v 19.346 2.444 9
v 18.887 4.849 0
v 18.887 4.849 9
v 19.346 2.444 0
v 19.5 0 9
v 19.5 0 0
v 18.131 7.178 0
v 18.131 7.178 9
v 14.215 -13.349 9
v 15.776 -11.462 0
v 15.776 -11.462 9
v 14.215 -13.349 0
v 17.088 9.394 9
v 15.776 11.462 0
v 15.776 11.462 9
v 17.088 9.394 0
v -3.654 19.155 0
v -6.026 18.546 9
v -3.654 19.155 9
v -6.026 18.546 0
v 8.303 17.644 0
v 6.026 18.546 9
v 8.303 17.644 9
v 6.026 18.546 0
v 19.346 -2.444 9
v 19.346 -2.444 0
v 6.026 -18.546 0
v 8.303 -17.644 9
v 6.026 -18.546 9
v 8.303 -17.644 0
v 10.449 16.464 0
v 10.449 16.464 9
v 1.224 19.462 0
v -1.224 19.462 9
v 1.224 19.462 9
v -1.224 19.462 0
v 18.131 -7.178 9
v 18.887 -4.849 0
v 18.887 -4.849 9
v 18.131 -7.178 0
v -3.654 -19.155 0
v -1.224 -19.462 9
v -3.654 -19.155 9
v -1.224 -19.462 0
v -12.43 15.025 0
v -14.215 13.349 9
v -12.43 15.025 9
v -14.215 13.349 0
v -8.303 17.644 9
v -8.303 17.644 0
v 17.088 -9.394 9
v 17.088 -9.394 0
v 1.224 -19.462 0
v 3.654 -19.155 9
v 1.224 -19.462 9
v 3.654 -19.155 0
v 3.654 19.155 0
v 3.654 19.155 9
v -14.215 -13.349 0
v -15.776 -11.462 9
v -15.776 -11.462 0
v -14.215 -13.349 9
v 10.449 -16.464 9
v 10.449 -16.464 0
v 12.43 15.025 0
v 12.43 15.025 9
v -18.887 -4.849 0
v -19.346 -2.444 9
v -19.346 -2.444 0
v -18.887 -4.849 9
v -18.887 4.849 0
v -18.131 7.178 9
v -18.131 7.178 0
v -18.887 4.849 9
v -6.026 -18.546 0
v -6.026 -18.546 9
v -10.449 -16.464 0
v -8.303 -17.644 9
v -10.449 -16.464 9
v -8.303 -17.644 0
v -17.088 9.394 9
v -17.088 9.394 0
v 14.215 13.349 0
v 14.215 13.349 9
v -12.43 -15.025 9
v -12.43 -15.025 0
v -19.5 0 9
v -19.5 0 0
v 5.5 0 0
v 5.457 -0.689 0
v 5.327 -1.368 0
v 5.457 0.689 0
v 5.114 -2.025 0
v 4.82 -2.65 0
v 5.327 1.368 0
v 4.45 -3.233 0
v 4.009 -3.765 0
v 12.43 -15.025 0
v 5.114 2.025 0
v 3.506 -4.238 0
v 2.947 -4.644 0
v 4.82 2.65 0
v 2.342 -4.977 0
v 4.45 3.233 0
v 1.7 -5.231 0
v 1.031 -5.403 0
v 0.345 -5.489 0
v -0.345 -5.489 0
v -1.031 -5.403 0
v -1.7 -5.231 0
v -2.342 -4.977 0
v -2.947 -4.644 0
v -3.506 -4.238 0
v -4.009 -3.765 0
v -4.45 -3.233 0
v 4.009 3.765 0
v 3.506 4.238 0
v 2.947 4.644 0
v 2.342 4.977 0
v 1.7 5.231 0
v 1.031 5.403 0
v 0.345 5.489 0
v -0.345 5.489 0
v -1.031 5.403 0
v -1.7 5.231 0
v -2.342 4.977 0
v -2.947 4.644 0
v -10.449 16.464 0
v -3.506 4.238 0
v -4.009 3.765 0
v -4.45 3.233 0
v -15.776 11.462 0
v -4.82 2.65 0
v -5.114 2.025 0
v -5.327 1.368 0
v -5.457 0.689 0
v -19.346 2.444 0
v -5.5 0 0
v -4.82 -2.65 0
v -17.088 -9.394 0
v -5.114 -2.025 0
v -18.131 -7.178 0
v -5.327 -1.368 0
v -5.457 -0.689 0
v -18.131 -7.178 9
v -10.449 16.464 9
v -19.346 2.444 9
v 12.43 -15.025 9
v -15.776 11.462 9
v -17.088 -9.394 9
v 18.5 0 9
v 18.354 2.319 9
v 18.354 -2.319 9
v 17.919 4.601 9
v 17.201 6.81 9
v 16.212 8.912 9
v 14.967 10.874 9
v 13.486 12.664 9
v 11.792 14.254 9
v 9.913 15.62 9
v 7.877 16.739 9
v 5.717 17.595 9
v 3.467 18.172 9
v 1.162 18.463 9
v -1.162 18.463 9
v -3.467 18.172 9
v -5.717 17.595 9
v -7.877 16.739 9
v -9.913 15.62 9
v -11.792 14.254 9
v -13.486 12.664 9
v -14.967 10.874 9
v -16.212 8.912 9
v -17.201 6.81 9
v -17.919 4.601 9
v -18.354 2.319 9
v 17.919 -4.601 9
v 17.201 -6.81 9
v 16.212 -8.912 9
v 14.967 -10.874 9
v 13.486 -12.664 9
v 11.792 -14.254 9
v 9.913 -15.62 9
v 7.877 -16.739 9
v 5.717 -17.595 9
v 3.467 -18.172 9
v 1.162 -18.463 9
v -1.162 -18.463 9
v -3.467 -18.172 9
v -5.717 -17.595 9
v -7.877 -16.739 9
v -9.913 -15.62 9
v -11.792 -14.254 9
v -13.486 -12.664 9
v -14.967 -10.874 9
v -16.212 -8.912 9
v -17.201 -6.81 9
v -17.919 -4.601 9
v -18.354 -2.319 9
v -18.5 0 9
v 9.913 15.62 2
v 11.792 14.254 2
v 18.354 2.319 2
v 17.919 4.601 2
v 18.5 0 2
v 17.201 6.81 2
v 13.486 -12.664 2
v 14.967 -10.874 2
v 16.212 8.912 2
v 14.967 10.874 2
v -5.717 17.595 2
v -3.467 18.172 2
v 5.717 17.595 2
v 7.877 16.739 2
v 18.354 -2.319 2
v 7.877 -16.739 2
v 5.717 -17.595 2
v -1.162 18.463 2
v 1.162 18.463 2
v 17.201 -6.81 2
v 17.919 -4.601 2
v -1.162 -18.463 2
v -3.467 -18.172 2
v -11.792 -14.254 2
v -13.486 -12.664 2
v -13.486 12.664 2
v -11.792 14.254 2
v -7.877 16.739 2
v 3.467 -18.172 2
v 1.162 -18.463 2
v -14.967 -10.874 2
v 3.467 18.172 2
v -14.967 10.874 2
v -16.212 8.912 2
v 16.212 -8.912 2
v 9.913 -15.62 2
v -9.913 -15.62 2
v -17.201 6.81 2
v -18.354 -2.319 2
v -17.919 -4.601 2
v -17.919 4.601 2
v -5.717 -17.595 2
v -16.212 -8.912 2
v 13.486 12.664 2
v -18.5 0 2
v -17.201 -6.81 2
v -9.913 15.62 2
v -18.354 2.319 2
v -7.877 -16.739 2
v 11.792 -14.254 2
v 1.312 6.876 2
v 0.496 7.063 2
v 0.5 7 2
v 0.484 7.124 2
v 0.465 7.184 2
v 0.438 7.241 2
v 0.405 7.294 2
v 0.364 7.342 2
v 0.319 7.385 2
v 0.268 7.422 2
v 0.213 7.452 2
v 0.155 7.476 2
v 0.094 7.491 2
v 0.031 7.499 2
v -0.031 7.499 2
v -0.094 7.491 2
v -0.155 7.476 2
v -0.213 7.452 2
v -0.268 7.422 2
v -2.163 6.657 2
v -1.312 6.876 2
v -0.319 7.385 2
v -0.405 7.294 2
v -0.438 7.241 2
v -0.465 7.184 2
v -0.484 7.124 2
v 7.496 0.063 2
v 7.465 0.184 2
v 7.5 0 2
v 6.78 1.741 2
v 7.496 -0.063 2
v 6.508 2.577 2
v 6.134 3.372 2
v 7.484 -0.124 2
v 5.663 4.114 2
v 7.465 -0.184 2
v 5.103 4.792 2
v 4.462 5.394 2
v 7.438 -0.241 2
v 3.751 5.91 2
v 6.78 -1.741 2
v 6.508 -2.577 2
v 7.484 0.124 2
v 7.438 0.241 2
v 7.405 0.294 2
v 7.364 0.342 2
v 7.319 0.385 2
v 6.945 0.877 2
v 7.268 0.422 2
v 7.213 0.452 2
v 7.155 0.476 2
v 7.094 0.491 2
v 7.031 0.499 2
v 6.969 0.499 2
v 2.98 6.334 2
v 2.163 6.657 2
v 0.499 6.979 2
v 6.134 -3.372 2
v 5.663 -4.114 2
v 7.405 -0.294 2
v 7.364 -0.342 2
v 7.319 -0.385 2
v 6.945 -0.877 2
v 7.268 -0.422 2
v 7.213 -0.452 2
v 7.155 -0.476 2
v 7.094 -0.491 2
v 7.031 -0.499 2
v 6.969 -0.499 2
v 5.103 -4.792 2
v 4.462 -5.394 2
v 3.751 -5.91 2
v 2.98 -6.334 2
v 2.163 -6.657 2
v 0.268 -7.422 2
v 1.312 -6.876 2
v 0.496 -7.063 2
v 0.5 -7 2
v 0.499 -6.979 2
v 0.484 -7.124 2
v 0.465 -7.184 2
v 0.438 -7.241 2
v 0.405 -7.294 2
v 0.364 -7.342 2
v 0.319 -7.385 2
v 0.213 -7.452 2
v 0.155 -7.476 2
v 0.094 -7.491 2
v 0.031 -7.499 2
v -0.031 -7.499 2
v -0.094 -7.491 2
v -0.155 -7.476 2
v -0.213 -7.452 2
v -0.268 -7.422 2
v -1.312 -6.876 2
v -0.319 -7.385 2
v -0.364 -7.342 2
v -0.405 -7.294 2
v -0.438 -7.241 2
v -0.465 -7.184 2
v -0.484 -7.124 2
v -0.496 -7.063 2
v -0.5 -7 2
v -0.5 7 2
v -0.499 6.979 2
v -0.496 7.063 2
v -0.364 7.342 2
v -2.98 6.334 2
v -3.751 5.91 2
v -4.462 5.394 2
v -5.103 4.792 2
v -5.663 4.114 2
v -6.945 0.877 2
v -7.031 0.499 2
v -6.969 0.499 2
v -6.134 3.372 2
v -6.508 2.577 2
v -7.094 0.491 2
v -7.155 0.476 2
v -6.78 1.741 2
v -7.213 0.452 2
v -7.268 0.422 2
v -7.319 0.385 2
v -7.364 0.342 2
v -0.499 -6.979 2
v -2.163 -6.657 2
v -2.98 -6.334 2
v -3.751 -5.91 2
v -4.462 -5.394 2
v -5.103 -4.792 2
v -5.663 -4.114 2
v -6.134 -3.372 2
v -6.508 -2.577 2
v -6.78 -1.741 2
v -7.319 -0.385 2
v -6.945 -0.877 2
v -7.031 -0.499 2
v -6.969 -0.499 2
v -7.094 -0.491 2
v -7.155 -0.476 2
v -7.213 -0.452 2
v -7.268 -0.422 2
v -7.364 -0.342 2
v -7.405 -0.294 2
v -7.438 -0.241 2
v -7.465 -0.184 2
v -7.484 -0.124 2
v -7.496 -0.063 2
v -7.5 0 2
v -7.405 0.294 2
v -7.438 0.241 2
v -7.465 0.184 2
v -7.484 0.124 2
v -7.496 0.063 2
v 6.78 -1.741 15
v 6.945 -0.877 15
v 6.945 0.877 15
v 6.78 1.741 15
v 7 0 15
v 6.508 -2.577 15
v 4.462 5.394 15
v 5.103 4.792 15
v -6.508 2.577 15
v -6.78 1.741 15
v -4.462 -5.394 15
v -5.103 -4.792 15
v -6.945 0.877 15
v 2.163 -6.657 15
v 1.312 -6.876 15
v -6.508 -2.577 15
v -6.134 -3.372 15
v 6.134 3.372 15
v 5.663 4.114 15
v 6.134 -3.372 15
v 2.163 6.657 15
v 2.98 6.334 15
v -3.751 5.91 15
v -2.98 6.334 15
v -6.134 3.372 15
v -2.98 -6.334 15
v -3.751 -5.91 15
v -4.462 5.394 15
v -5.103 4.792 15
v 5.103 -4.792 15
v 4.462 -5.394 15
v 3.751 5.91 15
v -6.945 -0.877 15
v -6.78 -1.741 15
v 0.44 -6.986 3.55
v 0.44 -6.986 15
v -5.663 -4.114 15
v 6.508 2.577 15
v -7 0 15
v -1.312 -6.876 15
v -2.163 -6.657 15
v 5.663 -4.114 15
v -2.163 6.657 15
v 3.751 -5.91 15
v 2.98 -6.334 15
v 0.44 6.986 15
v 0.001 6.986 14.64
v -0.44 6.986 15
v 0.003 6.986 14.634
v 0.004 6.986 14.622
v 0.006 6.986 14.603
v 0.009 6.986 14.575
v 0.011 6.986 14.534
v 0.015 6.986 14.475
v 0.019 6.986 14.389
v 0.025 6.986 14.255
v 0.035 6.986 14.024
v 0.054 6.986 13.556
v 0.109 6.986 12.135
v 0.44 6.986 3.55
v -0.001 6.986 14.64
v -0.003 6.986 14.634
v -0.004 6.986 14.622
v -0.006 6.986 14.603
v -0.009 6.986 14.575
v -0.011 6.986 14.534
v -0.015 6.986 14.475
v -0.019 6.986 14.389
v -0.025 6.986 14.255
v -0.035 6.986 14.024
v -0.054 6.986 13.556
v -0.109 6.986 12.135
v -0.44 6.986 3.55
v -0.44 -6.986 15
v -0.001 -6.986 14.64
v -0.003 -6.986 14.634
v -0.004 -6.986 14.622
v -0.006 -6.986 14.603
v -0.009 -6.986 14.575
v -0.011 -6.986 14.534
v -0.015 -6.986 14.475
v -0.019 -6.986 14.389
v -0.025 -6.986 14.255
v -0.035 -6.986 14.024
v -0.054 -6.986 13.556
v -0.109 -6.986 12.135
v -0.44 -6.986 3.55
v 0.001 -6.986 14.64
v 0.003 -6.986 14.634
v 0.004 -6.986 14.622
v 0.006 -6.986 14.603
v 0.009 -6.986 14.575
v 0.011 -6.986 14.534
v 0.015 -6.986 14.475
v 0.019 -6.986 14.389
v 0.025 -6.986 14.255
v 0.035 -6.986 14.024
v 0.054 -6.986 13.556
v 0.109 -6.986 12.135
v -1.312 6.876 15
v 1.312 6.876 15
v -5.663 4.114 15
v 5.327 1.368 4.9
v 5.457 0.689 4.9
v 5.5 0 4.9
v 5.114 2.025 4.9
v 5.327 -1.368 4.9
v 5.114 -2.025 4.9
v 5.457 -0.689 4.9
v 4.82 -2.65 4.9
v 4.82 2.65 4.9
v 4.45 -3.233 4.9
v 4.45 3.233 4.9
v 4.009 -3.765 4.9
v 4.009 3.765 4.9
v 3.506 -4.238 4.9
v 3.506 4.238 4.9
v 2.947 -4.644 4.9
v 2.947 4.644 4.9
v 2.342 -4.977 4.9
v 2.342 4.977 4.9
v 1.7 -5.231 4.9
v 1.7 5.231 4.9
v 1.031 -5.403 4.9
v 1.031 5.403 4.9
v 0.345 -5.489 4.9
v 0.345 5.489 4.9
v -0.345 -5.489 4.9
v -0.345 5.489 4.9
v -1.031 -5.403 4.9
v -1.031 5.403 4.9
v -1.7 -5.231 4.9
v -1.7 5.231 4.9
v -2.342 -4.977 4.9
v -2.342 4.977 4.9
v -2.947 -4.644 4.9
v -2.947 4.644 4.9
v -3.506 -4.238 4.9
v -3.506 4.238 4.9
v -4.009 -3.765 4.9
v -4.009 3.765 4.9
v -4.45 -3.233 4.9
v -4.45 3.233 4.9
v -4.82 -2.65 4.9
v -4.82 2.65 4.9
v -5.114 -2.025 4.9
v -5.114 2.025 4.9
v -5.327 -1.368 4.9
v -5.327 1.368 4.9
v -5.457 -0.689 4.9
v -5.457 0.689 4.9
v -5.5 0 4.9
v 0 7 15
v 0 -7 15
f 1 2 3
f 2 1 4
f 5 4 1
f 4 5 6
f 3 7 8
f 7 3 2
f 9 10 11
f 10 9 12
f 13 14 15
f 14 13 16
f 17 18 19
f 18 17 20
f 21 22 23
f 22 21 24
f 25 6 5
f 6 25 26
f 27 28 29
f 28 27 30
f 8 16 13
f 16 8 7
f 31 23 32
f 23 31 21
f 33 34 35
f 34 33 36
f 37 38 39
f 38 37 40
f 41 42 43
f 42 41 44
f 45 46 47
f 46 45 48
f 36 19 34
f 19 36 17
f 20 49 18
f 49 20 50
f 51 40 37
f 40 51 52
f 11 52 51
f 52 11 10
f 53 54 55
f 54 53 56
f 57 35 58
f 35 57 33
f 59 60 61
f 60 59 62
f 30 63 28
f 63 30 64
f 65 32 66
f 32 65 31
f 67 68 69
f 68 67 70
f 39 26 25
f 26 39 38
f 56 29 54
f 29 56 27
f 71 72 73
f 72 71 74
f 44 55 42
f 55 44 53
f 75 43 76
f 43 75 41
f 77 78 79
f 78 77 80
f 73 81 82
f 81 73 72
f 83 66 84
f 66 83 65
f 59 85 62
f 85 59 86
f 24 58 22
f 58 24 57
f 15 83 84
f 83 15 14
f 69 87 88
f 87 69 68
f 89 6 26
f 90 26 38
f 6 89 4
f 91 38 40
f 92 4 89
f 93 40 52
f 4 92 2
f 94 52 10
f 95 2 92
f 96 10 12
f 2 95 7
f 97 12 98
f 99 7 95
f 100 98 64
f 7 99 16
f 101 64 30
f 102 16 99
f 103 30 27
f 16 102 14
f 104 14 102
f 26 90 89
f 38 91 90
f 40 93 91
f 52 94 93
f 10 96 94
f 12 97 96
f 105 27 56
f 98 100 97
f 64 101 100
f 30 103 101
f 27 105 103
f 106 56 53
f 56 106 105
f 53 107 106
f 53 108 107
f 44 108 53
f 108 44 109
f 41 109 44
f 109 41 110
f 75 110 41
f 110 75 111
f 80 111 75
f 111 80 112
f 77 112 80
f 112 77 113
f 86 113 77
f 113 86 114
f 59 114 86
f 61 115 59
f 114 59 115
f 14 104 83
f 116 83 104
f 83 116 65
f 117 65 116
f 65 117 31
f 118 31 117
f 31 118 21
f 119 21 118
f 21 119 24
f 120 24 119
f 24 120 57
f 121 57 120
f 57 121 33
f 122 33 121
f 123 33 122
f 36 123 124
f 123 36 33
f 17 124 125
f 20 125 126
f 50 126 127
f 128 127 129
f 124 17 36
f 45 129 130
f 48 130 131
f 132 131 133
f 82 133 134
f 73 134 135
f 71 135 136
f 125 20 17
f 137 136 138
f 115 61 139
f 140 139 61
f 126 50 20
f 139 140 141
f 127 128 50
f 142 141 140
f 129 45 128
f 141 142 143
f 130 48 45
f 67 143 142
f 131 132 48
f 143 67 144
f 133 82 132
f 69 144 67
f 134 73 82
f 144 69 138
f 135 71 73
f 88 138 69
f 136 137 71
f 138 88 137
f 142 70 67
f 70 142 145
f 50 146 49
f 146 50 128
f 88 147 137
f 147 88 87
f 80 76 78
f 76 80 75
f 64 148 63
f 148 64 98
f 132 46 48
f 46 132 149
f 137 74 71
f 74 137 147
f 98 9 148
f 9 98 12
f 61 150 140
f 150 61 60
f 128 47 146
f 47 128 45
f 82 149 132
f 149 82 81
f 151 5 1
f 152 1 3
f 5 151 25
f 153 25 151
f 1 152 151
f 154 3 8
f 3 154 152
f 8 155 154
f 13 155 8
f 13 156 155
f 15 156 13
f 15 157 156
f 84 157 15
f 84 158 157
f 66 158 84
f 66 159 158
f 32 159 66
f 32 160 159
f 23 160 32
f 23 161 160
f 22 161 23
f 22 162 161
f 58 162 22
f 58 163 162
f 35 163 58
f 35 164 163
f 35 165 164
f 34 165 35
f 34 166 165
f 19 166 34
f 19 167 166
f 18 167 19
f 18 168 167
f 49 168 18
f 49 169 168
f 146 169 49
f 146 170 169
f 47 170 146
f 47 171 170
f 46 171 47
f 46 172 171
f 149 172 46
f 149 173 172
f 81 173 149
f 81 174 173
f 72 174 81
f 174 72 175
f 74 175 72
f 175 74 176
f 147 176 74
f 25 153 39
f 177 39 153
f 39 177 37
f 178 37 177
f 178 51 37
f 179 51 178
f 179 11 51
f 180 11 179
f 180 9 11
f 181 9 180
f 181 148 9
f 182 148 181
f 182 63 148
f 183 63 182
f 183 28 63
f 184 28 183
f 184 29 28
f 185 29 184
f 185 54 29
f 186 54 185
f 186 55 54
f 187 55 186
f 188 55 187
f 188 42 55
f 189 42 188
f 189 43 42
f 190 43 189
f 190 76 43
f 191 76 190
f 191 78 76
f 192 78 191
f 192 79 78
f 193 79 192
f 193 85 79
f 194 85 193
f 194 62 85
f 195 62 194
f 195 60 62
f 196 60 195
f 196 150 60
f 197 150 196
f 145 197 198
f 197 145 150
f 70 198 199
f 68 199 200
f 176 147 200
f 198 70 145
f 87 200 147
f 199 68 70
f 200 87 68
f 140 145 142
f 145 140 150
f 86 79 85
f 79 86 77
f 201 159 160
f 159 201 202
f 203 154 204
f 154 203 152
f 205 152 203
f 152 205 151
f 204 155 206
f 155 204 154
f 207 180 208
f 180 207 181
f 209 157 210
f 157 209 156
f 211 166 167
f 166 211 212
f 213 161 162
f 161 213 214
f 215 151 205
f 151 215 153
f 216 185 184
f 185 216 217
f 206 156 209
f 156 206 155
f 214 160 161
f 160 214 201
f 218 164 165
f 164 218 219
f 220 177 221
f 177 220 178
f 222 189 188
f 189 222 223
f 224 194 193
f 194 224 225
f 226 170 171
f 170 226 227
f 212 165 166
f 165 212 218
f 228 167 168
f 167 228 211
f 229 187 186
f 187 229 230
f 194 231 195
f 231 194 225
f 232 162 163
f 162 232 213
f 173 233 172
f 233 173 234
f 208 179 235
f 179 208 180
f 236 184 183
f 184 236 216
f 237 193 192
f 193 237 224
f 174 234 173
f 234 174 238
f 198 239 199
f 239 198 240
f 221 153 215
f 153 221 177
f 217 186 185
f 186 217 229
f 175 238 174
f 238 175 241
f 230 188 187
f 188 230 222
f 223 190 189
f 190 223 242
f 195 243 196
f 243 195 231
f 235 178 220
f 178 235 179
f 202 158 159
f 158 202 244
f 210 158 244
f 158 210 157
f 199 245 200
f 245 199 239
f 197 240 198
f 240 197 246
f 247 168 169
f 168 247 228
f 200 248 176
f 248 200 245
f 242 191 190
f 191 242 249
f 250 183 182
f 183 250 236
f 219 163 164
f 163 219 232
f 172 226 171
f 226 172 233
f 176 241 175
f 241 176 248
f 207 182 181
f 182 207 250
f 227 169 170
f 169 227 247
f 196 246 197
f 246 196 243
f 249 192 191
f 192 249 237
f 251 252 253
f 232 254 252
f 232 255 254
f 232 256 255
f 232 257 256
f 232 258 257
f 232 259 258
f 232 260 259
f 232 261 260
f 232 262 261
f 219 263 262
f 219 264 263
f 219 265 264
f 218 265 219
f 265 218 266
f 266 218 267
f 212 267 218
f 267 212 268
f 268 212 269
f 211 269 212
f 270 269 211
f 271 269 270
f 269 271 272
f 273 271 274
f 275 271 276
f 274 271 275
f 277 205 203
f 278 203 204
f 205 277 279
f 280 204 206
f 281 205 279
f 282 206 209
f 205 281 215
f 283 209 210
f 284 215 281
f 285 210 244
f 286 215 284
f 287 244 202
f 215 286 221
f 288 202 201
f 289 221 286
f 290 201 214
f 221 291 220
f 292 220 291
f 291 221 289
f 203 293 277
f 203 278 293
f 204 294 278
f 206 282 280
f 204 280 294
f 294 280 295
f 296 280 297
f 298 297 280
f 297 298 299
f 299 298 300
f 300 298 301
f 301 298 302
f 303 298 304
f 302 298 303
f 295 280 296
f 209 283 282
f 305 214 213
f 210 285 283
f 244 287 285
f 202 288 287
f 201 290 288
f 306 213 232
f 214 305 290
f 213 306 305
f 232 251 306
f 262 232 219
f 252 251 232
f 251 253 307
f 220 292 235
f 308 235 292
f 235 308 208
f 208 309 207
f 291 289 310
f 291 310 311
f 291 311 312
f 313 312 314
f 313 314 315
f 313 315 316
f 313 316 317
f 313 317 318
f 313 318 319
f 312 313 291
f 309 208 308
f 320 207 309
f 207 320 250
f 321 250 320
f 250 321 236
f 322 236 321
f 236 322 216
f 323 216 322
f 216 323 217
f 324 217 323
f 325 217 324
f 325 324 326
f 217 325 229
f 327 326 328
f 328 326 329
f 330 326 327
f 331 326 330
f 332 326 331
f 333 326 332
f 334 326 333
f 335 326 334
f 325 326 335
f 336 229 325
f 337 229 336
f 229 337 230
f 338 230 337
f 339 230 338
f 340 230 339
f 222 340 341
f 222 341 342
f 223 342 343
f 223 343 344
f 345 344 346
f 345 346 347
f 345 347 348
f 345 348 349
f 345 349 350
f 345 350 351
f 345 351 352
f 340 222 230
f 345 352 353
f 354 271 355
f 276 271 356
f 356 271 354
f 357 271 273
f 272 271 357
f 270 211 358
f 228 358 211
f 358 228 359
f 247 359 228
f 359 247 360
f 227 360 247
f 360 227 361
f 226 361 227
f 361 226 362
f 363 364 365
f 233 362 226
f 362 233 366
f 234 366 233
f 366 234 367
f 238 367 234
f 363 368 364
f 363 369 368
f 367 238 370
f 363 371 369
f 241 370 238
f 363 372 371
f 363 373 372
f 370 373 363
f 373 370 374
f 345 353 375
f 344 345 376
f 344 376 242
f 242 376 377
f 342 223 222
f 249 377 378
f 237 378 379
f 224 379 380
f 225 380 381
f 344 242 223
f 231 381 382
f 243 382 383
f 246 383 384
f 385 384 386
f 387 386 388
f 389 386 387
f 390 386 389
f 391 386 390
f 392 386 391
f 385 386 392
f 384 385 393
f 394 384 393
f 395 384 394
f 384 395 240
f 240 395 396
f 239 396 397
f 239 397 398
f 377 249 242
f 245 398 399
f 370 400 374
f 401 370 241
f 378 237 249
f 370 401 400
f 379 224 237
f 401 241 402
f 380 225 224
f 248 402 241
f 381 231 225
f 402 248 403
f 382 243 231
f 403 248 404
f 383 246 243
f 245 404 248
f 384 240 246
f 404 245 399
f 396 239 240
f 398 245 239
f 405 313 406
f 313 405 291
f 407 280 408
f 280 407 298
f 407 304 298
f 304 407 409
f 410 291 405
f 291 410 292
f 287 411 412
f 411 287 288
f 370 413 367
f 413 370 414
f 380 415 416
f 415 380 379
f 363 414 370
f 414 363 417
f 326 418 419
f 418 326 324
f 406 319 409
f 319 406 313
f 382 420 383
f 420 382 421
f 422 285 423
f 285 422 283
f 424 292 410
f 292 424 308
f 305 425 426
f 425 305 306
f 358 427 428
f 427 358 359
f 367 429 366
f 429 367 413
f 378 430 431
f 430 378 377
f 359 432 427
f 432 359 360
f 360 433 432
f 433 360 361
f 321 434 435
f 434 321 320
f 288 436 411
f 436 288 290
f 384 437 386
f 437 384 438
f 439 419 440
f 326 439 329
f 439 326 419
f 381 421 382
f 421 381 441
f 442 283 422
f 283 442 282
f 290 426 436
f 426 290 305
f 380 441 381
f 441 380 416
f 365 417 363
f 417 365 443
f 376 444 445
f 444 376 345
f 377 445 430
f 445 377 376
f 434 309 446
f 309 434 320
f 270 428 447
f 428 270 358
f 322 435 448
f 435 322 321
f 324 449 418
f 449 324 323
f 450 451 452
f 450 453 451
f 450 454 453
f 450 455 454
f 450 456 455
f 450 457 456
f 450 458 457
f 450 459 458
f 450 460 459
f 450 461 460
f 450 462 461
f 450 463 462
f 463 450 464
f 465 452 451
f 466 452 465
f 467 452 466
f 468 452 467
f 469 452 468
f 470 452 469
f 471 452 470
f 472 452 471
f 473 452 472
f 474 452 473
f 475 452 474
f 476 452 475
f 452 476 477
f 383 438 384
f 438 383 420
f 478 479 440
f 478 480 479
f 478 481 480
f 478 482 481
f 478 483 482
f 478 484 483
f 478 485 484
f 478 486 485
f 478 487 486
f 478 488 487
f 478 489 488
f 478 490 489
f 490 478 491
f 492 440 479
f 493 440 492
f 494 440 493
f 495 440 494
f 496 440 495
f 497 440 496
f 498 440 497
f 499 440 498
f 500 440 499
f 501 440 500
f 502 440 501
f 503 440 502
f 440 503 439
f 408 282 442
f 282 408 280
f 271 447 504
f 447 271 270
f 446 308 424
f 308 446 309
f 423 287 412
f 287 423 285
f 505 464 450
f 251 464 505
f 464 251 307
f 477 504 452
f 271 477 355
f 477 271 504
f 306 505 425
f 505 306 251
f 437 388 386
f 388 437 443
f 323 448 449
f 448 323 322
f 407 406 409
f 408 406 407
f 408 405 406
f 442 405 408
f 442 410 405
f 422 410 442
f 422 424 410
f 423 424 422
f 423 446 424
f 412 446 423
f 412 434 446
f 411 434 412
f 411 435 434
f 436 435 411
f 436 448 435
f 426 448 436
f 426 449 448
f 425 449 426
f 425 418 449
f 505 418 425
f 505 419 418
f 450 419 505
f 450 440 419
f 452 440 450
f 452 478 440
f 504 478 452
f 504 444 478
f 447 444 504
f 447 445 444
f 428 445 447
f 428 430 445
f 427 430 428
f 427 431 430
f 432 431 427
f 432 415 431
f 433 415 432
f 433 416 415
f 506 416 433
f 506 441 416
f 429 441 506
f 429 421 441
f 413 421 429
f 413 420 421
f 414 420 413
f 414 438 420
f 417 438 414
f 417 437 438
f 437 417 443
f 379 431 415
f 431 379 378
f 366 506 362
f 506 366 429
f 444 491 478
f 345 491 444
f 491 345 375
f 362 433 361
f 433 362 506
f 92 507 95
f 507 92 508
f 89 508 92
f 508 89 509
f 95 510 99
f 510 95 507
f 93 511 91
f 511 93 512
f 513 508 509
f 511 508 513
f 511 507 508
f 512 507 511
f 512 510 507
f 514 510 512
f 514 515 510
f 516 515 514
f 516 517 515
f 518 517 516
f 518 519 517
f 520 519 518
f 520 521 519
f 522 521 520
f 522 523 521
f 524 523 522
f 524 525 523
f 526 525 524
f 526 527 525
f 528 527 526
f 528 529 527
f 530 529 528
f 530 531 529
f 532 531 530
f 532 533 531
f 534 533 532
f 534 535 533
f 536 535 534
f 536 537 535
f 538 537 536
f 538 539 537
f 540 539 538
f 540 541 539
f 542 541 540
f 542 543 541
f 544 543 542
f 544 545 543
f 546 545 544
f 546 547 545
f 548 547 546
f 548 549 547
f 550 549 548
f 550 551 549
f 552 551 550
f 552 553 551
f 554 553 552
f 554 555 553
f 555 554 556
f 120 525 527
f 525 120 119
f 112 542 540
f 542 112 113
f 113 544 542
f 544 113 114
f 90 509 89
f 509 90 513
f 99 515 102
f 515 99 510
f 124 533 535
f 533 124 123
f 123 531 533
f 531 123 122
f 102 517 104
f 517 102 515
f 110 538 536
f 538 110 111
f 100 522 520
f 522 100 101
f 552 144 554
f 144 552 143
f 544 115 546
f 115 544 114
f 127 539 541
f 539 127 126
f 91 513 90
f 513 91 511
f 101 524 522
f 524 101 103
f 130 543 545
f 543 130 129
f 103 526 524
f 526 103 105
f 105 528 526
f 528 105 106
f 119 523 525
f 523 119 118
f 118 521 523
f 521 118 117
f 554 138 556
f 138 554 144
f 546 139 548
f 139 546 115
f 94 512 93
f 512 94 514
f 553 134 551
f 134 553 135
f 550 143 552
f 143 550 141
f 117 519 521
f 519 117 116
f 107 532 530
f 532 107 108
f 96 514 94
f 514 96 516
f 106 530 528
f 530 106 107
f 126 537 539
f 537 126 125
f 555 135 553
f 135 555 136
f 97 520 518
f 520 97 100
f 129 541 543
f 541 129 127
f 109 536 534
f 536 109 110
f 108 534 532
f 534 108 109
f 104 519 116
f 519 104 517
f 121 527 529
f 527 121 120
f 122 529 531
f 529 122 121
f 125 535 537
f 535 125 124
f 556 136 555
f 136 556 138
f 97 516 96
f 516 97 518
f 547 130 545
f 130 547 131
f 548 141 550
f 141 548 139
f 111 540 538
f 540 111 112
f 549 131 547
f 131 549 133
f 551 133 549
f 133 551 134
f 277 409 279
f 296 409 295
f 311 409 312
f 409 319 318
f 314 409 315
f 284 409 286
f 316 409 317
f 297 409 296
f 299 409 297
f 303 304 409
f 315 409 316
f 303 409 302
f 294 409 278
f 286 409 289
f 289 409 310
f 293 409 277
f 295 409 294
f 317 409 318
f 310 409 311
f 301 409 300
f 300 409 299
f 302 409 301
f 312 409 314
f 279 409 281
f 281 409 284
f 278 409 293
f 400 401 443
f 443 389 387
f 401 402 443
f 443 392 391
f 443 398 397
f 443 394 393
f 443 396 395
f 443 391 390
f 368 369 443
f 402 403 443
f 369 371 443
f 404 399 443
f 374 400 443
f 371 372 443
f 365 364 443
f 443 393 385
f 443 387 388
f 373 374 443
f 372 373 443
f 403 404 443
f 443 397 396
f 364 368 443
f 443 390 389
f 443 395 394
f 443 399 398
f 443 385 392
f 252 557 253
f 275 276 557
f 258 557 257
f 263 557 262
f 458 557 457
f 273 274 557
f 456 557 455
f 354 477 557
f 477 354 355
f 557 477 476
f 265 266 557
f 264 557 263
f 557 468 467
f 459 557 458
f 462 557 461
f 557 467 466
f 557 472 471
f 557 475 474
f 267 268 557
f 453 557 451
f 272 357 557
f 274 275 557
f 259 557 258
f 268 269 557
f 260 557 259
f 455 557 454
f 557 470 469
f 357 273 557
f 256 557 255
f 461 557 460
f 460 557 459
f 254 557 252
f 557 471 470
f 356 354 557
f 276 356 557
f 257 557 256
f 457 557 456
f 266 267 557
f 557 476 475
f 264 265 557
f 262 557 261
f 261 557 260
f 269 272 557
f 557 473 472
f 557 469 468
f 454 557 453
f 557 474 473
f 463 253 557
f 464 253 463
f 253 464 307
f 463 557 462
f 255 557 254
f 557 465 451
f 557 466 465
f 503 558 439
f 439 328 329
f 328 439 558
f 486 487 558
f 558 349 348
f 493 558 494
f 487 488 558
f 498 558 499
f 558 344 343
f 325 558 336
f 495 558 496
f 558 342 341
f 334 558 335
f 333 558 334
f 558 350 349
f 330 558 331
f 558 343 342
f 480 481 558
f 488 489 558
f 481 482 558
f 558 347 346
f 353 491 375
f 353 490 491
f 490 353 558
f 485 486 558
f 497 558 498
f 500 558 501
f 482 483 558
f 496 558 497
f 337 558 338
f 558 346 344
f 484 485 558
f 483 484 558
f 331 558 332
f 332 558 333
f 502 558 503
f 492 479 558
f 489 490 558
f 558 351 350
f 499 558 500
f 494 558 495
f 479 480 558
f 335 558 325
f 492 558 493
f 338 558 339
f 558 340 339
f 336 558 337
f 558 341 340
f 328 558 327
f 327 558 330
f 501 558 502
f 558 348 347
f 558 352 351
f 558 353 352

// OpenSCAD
$fn=50;

e = 0.1;

// side 1
cap_h = 9;
cap_d = 39;
cap_wall_thick = 2;
ins_h = 15;
ins_d = 14;

// side 2
rec_h = 5;
rec_d = 11;
stop_h = 2;
stop_d = 7;

// helper vars
cap_r = cap_d / 2;
cap_r2 = (cap_d - cap_wall_thick) / 2;
ins_r = ins_d / 2;
rec_r = rec_d / 2;
stop_r = stop_d / 2;

// side 1
difference() {
    side1();

    // side 2
    translate([0, 0, -e])
        cylinder(rec_h, rec_r, rec_r);
}

translate([ins_r, 0, 0])
    spacer();
translate([-ins_r, 0, 0])
    spacer();
translate([0, ins_r, 0])
    spacer();
translate([0, -ins_r, 0])
    spacer();


module side1()
{
    difference() {
        cylinder(cap_h, cap_r, cap_r);
        
        translate([0, 0, cap_wall_thick])
            cylinder(cap_h - cap_wall_thick + e, cap_r2, cap_r2);
    }

    cylinder(ins_h, ins_r, ins_r);
}

module spacer()
{
    translate([0, 0, cap_wall_thick])
        cylinder(ins_h - cap_wall_thick, 0.5, 0);
}
